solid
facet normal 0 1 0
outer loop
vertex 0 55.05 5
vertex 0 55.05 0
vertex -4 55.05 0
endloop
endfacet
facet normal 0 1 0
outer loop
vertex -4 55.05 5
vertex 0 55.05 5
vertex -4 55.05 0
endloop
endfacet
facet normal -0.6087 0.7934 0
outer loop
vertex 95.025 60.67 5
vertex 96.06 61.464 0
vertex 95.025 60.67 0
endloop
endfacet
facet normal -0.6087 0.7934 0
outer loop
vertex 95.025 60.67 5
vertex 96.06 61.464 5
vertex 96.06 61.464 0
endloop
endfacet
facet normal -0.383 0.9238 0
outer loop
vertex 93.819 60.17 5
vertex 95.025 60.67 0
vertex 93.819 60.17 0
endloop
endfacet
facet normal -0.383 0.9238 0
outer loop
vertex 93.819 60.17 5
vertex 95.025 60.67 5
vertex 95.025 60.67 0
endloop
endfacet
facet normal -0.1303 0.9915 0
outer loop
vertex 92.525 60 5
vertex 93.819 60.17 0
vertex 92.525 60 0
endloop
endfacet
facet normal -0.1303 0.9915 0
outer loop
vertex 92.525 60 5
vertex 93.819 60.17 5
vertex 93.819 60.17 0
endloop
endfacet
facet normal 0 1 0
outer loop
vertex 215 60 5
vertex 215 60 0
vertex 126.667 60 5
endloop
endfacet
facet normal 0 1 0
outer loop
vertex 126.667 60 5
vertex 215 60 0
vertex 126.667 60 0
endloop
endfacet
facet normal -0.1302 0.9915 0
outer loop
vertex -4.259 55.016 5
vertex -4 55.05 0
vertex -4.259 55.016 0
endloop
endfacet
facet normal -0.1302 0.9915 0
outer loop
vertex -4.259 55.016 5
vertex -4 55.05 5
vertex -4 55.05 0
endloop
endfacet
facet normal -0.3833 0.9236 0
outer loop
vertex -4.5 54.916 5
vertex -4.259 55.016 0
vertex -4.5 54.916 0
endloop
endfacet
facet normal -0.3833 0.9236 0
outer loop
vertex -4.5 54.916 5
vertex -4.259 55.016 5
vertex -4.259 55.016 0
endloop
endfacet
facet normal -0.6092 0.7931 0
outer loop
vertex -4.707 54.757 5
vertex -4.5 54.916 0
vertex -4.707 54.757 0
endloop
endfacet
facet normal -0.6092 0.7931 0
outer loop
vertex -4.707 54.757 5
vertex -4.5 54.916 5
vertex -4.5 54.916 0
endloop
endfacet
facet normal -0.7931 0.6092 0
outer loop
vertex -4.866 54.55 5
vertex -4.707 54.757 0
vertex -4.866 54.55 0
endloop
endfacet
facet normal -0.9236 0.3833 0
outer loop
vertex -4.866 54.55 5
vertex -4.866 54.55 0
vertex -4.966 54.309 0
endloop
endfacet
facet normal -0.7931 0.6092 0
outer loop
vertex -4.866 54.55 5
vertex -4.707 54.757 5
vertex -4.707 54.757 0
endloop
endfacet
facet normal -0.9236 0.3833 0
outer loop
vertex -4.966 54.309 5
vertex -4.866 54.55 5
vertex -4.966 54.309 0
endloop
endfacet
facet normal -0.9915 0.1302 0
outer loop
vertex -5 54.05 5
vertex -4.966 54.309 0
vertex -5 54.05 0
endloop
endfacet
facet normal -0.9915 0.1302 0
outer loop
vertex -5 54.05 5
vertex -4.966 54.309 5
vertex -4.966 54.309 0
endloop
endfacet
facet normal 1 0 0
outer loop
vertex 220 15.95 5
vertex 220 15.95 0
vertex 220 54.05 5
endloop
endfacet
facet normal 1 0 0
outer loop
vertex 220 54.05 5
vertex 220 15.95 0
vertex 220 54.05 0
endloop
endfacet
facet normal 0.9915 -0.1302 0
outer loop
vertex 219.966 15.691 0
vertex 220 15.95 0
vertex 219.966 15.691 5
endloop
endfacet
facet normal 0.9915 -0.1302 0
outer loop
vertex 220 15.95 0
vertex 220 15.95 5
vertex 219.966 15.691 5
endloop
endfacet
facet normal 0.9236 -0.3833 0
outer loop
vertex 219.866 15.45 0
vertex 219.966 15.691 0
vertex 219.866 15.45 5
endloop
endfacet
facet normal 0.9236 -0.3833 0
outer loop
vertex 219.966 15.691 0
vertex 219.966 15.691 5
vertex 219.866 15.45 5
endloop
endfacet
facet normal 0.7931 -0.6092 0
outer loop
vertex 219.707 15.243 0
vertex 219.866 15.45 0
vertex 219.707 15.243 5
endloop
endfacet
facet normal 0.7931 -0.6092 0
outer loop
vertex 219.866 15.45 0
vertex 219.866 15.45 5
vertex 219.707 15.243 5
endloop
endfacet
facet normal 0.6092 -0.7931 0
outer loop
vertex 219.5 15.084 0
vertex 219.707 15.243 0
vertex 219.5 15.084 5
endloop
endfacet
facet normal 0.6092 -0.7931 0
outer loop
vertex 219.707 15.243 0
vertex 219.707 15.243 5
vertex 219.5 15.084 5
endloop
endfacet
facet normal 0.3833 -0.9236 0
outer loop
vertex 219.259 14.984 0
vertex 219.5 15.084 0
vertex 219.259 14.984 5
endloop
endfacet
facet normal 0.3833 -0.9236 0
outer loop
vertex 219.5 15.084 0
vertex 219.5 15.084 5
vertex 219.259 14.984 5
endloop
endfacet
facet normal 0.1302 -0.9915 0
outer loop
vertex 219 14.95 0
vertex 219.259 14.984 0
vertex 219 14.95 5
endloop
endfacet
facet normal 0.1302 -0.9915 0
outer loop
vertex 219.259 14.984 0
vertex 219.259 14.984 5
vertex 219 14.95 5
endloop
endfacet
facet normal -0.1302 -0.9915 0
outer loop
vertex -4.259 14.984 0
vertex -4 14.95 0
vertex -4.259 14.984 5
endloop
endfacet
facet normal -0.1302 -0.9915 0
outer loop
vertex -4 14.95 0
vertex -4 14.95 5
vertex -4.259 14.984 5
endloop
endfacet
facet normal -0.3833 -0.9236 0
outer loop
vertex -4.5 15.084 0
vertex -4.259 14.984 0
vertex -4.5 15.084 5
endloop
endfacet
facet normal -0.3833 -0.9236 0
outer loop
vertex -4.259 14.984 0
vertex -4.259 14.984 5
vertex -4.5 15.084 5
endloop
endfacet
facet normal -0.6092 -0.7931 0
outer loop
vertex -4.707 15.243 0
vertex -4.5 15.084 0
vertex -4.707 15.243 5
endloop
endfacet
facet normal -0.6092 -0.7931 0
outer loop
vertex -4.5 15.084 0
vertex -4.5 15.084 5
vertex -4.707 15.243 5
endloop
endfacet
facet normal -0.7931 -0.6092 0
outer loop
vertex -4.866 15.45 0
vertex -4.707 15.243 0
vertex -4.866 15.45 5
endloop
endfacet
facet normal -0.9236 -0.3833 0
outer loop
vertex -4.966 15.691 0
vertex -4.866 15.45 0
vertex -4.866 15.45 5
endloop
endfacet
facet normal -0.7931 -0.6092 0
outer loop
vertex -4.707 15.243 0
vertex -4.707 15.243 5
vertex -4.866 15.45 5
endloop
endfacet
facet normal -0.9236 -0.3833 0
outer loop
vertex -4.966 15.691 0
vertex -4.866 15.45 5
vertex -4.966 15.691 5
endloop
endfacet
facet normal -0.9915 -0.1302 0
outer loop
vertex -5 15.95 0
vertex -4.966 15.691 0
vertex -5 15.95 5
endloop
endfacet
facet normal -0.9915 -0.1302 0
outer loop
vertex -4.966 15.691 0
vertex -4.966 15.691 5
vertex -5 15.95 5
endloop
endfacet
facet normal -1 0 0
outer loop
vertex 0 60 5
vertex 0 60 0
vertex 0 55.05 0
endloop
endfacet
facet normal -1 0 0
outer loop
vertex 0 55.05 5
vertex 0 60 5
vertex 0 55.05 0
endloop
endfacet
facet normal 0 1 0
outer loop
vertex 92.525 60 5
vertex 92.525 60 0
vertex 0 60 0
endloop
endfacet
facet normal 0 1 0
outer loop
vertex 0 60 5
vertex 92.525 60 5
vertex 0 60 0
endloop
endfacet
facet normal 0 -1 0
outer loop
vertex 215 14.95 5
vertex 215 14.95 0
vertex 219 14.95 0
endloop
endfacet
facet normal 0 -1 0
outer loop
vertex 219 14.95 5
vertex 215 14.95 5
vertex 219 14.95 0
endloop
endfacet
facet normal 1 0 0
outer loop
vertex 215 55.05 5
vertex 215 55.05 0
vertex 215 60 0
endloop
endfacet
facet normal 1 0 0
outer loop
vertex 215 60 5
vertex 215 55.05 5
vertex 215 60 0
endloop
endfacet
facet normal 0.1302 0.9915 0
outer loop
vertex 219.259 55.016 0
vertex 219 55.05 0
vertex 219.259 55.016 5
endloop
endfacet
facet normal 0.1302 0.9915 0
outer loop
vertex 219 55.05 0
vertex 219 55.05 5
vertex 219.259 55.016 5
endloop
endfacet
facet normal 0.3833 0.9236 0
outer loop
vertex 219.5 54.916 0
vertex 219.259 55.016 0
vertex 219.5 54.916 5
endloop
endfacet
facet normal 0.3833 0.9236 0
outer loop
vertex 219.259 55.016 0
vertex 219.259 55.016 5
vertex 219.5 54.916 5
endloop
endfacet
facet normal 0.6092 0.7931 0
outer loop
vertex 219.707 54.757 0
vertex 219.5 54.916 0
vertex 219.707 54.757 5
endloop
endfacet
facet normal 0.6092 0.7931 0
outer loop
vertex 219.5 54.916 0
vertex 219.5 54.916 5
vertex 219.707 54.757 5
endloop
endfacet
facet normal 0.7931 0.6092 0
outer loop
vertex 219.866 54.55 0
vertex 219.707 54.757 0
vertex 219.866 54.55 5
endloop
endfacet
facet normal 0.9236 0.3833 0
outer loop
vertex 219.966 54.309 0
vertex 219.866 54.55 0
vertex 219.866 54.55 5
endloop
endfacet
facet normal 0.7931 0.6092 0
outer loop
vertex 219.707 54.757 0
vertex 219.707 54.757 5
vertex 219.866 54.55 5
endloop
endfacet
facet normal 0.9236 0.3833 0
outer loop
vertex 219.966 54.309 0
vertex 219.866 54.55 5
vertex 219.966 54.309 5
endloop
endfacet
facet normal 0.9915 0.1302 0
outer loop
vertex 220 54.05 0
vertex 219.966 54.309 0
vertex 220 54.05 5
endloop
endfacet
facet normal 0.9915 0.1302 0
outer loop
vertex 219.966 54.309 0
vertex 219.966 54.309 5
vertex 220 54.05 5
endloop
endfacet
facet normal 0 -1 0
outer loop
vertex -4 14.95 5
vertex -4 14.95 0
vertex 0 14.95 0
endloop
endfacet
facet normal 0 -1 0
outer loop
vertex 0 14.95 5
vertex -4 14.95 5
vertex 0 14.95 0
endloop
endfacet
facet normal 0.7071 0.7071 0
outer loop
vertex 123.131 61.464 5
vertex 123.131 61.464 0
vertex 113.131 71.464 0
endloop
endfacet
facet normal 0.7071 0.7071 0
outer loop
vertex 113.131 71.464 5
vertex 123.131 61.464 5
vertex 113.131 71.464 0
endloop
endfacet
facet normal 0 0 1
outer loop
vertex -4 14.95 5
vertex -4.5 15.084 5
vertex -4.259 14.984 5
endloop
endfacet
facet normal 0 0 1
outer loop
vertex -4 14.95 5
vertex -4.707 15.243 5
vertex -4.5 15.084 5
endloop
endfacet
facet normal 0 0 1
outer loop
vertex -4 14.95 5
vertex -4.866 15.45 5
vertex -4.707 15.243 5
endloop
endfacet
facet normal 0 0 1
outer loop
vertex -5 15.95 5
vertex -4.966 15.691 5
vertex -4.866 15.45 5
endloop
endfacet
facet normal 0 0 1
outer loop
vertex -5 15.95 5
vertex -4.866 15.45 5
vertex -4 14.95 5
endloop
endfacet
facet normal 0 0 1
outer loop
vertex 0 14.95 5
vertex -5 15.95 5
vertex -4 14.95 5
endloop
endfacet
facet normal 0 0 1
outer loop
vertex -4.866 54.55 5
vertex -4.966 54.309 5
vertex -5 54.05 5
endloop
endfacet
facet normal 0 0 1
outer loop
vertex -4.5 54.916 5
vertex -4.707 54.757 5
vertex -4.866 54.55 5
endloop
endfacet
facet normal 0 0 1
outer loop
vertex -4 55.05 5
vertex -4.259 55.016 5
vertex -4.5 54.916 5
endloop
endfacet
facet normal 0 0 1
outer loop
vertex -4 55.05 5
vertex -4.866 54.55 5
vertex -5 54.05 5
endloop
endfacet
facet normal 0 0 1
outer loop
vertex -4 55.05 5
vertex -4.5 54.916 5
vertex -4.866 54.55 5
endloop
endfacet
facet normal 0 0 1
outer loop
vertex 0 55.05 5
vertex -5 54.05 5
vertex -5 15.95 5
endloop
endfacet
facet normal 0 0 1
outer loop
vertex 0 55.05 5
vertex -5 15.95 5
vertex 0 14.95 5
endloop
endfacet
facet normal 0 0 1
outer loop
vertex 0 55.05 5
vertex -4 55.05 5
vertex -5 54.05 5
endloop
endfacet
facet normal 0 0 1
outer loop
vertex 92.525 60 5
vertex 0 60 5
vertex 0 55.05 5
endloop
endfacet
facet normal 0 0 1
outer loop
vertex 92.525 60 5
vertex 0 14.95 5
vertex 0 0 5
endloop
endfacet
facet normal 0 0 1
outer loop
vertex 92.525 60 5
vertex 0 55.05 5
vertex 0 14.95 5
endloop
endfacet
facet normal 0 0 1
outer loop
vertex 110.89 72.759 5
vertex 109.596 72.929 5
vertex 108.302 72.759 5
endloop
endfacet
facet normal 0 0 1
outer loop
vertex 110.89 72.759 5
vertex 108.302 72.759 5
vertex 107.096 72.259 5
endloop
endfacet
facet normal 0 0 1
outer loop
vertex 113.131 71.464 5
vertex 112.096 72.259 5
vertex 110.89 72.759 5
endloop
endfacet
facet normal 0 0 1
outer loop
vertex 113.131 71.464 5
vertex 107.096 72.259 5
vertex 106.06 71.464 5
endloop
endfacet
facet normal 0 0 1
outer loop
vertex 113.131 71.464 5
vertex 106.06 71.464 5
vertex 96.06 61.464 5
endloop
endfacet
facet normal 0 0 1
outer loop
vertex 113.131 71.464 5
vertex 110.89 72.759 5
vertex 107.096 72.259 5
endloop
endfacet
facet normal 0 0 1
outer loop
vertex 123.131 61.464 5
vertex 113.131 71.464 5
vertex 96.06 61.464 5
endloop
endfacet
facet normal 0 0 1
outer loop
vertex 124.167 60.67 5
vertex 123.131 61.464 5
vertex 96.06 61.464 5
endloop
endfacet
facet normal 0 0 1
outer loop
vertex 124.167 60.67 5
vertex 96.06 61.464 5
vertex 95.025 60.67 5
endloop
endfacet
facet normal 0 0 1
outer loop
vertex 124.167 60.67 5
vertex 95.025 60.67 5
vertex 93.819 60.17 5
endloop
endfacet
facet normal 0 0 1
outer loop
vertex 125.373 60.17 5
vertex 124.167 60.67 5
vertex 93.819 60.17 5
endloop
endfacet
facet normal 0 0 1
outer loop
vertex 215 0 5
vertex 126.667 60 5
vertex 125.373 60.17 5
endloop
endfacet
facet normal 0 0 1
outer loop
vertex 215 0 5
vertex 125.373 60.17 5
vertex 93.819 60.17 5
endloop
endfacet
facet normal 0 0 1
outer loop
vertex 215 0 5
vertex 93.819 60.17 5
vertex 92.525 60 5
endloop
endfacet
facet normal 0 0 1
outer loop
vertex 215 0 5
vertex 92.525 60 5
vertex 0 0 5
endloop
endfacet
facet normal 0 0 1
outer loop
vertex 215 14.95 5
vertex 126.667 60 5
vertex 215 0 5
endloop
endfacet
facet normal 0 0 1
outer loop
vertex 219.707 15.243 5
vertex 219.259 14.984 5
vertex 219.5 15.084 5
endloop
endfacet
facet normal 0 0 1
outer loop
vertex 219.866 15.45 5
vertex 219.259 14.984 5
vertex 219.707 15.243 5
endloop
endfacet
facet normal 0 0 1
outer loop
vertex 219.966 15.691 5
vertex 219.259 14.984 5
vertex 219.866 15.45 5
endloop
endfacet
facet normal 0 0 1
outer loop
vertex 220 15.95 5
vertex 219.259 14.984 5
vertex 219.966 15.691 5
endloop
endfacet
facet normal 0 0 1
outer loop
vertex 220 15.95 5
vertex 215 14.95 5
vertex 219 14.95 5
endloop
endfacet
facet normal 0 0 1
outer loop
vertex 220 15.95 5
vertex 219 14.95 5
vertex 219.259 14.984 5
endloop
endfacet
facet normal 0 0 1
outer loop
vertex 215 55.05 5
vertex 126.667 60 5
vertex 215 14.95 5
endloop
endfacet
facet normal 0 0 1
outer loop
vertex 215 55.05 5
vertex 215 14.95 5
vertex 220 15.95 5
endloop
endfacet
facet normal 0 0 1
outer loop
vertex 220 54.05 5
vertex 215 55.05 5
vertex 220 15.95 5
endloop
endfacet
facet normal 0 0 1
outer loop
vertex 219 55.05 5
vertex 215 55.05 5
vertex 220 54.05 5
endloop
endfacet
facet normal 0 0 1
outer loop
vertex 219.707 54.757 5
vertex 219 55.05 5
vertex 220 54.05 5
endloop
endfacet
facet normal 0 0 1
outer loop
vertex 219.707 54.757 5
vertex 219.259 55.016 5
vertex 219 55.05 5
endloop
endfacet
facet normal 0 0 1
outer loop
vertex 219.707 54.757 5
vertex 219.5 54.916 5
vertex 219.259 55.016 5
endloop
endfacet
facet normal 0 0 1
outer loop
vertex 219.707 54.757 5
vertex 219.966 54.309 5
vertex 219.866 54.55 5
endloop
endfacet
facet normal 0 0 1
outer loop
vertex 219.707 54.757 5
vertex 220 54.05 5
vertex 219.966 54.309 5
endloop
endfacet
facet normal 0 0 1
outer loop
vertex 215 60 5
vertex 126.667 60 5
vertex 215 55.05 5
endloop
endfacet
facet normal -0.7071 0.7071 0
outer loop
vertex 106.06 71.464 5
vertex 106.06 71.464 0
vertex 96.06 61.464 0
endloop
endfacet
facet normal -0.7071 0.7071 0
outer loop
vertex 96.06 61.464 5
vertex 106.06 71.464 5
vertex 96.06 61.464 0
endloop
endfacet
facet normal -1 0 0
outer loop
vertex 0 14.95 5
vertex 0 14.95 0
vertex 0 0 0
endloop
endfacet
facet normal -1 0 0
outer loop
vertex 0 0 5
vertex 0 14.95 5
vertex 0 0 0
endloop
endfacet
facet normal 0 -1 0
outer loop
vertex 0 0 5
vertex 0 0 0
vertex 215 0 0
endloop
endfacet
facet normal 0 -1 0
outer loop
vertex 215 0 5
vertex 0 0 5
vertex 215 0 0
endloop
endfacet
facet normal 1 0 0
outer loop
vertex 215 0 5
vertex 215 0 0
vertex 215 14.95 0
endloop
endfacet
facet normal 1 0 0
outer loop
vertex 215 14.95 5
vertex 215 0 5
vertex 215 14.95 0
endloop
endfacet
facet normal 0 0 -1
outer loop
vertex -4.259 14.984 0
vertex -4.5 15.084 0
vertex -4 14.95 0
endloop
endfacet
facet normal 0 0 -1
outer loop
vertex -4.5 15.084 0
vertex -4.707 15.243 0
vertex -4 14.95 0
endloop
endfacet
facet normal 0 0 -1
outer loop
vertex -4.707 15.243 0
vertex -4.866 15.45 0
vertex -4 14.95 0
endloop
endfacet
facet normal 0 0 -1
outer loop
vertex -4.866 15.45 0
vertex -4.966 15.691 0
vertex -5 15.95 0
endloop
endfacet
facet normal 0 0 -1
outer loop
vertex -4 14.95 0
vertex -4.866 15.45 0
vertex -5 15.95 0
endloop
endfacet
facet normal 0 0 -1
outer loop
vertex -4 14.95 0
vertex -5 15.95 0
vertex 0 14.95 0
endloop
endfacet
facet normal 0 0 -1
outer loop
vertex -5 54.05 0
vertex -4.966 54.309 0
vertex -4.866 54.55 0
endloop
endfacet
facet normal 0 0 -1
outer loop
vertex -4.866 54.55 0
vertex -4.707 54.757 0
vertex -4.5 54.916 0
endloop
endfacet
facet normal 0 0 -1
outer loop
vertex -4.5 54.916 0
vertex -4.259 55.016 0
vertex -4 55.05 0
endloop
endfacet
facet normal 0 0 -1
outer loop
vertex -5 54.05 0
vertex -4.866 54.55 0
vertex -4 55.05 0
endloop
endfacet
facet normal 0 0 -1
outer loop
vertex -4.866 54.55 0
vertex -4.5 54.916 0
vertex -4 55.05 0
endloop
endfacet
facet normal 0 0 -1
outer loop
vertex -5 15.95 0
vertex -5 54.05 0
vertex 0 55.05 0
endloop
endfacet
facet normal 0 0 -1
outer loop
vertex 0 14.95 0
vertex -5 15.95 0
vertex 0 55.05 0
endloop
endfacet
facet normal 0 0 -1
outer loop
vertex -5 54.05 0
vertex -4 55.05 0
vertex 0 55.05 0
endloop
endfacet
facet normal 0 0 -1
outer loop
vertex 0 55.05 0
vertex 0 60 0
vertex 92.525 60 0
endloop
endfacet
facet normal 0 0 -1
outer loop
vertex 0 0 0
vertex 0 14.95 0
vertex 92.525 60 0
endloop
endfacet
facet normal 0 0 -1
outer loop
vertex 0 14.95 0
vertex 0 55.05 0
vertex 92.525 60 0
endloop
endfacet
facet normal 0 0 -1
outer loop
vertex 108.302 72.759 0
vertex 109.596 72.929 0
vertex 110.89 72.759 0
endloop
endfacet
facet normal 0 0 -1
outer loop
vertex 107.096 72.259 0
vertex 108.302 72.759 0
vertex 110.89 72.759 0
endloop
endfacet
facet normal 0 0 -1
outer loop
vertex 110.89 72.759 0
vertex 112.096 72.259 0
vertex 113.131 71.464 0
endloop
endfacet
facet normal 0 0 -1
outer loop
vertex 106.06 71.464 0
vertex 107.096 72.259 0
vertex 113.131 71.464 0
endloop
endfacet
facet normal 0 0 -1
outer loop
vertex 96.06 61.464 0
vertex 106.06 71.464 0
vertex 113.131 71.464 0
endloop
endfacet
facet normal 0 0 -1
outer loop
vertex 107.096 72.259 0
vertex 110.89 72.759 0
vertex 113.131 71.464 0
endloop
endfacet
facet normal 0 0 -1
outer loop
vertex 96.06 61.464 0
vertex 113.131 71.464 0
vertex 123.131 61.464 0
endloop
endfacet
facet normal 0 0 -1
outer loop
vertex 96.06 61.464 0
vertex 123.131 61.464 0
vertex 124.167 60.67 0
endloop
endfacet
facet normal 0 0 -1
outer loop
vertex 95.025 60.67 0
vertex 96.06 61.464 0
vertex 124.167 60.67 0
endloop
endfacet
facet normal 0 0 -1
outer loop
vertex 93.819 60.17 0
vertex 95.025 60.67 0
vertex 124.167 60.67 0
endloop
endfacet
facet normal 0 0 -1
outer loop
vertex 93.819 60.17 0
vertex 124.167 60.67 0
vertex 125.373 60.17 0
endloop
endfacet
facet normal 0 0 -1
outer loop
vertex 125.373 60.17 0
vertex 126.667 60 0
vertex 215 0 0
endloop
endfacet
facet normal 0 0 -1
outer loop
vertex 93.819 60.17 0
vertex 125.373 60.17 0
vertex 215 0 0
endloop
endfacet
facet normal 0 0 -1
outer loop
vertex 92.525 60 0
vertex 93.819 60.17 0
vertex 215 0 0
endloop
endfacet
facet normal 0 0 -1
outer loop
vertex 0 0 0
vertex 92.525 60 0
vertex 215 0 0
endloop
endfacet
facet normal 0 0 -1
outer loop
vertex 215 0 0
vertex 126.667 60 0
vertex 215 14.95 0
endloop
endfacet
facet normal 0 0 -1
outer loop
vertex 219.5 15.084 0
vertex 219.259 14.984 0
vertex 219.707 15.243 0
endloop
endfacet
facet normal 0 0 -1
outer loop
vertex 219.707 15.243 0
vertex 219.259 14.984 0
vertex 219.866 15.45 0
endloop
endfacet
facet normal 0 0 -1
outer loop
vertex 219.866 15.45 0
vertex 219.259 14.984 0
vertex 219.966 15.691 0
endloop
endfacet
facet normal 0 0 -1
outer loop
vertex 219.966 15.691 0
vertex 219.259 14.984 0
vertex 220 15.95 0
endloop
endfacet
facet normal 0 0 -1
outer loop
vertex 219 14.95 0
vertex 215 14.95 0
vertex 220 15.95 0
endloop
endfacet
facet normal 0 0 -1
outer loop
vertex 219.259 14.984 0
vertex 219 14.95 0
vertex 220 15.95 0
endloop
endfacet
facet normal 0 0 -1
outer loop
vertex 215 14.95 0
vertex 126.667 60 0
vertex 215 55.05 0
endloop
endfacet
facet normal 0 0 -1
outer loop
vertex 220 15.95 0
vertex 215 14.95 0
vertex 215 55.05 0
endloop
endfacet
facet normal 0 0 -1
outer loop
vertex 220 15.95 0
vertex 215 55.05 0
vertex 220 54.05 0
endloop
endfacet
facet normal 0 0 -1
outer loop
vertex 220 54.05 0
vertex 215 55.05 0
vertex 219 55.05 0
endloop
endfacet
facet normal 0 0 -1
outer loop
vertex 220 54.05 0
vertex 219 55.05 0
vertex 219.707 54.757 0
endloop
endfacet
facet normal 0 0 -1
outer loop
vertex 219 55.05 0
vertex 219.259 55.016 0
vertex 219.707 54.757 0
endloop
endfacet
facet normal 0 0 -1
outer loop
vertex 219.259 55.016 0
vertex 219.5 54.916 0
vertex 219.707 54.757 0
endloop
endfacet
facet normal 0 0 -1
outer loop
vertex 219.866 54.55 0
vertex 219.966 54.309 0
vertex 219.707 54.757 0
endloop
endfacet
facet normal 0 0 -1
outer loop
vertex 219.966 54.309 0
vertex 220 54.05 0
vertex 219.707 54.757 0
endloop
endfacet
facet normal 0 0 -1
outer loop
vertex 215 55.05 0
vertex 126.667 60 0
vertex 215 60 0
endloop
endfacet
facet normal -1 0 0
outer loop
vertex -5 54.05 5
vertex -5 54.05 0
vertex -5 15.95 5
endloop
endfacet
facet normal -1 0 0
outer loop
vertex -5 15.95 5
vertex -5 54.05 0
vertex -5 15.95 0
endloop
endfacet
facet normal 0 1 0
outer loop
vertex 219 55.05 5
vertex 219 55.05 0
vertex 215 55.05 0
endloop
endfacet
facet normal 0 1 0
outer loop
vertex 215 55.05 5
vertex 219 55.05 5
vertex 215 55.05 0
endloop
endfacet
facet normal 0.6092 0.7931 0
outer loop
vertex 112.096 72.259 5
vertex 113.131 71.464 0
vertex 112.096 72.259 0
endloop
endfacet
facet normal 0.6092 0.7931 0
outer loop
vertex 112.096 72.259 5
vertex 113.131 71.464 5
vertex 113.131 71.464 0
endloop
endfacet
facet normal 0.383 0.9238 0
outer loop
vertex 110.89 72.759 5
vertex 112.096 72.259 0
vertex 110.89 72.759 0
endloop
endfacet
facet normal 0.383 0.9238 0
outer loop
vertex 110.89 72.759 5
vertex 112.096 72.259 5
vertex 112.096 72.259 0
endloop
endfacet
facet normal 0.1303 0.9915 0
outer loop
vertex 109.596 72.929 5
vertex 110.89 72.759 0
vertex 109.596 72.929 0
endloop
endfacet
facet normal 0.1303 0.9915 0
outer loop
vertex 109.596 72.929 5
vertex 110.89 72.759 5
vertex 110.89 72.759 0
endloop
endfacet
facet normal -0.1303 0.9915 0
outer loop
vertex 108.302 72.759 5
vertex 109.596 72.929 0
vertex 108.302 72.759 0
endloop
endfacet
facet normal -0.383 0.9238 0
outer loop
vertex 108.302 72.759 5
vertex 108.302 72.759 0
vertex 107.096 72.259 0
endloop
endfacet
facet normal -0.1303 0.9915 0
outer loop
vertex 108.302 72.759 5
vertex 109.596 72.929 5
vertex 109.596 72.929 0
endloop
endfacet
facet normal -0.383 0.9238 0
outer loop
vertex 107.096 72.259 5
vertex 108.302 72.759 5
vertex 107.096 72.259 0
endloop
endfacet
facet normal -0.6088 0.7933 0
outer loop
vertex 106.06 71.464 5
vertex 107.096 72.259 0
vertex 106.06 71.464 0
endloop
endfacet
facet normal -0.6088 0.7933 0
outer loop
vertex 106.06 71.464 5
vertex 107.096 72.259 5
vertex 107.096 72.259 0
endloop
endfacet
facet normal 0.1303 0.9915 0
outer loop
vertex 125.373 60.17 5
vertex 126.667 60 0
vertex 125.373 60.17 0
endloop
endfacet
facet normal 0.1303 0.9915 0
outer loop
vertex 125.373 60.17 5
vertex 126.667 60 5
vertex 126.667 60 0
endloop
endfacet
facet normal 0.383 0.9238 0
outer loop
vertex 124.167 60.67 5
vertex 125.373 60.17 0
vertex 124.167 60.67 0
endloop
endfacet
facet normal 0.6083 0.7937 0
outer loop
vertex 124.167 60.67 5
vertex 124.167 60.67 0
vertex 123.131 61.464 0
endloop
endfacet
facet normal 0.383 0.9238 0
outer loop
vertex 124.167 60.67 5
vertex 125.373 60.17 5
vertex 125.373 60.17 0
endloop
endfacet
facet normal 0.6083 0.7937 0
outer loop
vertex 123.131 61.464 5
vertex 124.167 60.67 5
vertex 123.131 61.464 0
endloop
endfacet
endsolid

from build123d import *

# Parameters (mm, degrees)
BOSS_EXTRUDE1_DEPTH = 5
FILLET1_R           = 5
FILLET2_R           = 1


with BuildPart() as part:
    # Sketch1 → Boss-Extrude1 (new body)
    with BuildSketch(Plane.XY):
        Polygon((215, 55.05), (215, 60), (124.595635172, 60), (109.595635172, 75), (94.595635172, 60), (0, 60), (0, 55.05), (-5, 55.05), (-5, 14.95), (0, 14.95), (0, 0), (215, 0), (215, 14.95), (220, 14.95), (220, 55.05), align=None)
    extrude(amount=BOSS_EXTRUDE1_DEPTH)

    # Fillet1
    fillet1_edges = [part.edges().sort_by_distance(p)[0] for p in [
        (94.595635172, 60, 2.5),
        (109.595635172, 75, 2.5),
        (124.595635172, 60, 2.5),
    ]]
    fillet(fillet1_edges, radius=FILLET1_R)

    # Fillet2
    fillet2_edges = [part.edges().sort_by_distance(p)[0] for p in [
        (-5, 14.95, 2.5),
        (-5, 55.05, 2.5),
        (220, 55.05, 2.5),
        (220, 14.95, 2.5),
    ]]
    fillet(fillet2_edges, radius=FILLET2_R)


solid = part.part
